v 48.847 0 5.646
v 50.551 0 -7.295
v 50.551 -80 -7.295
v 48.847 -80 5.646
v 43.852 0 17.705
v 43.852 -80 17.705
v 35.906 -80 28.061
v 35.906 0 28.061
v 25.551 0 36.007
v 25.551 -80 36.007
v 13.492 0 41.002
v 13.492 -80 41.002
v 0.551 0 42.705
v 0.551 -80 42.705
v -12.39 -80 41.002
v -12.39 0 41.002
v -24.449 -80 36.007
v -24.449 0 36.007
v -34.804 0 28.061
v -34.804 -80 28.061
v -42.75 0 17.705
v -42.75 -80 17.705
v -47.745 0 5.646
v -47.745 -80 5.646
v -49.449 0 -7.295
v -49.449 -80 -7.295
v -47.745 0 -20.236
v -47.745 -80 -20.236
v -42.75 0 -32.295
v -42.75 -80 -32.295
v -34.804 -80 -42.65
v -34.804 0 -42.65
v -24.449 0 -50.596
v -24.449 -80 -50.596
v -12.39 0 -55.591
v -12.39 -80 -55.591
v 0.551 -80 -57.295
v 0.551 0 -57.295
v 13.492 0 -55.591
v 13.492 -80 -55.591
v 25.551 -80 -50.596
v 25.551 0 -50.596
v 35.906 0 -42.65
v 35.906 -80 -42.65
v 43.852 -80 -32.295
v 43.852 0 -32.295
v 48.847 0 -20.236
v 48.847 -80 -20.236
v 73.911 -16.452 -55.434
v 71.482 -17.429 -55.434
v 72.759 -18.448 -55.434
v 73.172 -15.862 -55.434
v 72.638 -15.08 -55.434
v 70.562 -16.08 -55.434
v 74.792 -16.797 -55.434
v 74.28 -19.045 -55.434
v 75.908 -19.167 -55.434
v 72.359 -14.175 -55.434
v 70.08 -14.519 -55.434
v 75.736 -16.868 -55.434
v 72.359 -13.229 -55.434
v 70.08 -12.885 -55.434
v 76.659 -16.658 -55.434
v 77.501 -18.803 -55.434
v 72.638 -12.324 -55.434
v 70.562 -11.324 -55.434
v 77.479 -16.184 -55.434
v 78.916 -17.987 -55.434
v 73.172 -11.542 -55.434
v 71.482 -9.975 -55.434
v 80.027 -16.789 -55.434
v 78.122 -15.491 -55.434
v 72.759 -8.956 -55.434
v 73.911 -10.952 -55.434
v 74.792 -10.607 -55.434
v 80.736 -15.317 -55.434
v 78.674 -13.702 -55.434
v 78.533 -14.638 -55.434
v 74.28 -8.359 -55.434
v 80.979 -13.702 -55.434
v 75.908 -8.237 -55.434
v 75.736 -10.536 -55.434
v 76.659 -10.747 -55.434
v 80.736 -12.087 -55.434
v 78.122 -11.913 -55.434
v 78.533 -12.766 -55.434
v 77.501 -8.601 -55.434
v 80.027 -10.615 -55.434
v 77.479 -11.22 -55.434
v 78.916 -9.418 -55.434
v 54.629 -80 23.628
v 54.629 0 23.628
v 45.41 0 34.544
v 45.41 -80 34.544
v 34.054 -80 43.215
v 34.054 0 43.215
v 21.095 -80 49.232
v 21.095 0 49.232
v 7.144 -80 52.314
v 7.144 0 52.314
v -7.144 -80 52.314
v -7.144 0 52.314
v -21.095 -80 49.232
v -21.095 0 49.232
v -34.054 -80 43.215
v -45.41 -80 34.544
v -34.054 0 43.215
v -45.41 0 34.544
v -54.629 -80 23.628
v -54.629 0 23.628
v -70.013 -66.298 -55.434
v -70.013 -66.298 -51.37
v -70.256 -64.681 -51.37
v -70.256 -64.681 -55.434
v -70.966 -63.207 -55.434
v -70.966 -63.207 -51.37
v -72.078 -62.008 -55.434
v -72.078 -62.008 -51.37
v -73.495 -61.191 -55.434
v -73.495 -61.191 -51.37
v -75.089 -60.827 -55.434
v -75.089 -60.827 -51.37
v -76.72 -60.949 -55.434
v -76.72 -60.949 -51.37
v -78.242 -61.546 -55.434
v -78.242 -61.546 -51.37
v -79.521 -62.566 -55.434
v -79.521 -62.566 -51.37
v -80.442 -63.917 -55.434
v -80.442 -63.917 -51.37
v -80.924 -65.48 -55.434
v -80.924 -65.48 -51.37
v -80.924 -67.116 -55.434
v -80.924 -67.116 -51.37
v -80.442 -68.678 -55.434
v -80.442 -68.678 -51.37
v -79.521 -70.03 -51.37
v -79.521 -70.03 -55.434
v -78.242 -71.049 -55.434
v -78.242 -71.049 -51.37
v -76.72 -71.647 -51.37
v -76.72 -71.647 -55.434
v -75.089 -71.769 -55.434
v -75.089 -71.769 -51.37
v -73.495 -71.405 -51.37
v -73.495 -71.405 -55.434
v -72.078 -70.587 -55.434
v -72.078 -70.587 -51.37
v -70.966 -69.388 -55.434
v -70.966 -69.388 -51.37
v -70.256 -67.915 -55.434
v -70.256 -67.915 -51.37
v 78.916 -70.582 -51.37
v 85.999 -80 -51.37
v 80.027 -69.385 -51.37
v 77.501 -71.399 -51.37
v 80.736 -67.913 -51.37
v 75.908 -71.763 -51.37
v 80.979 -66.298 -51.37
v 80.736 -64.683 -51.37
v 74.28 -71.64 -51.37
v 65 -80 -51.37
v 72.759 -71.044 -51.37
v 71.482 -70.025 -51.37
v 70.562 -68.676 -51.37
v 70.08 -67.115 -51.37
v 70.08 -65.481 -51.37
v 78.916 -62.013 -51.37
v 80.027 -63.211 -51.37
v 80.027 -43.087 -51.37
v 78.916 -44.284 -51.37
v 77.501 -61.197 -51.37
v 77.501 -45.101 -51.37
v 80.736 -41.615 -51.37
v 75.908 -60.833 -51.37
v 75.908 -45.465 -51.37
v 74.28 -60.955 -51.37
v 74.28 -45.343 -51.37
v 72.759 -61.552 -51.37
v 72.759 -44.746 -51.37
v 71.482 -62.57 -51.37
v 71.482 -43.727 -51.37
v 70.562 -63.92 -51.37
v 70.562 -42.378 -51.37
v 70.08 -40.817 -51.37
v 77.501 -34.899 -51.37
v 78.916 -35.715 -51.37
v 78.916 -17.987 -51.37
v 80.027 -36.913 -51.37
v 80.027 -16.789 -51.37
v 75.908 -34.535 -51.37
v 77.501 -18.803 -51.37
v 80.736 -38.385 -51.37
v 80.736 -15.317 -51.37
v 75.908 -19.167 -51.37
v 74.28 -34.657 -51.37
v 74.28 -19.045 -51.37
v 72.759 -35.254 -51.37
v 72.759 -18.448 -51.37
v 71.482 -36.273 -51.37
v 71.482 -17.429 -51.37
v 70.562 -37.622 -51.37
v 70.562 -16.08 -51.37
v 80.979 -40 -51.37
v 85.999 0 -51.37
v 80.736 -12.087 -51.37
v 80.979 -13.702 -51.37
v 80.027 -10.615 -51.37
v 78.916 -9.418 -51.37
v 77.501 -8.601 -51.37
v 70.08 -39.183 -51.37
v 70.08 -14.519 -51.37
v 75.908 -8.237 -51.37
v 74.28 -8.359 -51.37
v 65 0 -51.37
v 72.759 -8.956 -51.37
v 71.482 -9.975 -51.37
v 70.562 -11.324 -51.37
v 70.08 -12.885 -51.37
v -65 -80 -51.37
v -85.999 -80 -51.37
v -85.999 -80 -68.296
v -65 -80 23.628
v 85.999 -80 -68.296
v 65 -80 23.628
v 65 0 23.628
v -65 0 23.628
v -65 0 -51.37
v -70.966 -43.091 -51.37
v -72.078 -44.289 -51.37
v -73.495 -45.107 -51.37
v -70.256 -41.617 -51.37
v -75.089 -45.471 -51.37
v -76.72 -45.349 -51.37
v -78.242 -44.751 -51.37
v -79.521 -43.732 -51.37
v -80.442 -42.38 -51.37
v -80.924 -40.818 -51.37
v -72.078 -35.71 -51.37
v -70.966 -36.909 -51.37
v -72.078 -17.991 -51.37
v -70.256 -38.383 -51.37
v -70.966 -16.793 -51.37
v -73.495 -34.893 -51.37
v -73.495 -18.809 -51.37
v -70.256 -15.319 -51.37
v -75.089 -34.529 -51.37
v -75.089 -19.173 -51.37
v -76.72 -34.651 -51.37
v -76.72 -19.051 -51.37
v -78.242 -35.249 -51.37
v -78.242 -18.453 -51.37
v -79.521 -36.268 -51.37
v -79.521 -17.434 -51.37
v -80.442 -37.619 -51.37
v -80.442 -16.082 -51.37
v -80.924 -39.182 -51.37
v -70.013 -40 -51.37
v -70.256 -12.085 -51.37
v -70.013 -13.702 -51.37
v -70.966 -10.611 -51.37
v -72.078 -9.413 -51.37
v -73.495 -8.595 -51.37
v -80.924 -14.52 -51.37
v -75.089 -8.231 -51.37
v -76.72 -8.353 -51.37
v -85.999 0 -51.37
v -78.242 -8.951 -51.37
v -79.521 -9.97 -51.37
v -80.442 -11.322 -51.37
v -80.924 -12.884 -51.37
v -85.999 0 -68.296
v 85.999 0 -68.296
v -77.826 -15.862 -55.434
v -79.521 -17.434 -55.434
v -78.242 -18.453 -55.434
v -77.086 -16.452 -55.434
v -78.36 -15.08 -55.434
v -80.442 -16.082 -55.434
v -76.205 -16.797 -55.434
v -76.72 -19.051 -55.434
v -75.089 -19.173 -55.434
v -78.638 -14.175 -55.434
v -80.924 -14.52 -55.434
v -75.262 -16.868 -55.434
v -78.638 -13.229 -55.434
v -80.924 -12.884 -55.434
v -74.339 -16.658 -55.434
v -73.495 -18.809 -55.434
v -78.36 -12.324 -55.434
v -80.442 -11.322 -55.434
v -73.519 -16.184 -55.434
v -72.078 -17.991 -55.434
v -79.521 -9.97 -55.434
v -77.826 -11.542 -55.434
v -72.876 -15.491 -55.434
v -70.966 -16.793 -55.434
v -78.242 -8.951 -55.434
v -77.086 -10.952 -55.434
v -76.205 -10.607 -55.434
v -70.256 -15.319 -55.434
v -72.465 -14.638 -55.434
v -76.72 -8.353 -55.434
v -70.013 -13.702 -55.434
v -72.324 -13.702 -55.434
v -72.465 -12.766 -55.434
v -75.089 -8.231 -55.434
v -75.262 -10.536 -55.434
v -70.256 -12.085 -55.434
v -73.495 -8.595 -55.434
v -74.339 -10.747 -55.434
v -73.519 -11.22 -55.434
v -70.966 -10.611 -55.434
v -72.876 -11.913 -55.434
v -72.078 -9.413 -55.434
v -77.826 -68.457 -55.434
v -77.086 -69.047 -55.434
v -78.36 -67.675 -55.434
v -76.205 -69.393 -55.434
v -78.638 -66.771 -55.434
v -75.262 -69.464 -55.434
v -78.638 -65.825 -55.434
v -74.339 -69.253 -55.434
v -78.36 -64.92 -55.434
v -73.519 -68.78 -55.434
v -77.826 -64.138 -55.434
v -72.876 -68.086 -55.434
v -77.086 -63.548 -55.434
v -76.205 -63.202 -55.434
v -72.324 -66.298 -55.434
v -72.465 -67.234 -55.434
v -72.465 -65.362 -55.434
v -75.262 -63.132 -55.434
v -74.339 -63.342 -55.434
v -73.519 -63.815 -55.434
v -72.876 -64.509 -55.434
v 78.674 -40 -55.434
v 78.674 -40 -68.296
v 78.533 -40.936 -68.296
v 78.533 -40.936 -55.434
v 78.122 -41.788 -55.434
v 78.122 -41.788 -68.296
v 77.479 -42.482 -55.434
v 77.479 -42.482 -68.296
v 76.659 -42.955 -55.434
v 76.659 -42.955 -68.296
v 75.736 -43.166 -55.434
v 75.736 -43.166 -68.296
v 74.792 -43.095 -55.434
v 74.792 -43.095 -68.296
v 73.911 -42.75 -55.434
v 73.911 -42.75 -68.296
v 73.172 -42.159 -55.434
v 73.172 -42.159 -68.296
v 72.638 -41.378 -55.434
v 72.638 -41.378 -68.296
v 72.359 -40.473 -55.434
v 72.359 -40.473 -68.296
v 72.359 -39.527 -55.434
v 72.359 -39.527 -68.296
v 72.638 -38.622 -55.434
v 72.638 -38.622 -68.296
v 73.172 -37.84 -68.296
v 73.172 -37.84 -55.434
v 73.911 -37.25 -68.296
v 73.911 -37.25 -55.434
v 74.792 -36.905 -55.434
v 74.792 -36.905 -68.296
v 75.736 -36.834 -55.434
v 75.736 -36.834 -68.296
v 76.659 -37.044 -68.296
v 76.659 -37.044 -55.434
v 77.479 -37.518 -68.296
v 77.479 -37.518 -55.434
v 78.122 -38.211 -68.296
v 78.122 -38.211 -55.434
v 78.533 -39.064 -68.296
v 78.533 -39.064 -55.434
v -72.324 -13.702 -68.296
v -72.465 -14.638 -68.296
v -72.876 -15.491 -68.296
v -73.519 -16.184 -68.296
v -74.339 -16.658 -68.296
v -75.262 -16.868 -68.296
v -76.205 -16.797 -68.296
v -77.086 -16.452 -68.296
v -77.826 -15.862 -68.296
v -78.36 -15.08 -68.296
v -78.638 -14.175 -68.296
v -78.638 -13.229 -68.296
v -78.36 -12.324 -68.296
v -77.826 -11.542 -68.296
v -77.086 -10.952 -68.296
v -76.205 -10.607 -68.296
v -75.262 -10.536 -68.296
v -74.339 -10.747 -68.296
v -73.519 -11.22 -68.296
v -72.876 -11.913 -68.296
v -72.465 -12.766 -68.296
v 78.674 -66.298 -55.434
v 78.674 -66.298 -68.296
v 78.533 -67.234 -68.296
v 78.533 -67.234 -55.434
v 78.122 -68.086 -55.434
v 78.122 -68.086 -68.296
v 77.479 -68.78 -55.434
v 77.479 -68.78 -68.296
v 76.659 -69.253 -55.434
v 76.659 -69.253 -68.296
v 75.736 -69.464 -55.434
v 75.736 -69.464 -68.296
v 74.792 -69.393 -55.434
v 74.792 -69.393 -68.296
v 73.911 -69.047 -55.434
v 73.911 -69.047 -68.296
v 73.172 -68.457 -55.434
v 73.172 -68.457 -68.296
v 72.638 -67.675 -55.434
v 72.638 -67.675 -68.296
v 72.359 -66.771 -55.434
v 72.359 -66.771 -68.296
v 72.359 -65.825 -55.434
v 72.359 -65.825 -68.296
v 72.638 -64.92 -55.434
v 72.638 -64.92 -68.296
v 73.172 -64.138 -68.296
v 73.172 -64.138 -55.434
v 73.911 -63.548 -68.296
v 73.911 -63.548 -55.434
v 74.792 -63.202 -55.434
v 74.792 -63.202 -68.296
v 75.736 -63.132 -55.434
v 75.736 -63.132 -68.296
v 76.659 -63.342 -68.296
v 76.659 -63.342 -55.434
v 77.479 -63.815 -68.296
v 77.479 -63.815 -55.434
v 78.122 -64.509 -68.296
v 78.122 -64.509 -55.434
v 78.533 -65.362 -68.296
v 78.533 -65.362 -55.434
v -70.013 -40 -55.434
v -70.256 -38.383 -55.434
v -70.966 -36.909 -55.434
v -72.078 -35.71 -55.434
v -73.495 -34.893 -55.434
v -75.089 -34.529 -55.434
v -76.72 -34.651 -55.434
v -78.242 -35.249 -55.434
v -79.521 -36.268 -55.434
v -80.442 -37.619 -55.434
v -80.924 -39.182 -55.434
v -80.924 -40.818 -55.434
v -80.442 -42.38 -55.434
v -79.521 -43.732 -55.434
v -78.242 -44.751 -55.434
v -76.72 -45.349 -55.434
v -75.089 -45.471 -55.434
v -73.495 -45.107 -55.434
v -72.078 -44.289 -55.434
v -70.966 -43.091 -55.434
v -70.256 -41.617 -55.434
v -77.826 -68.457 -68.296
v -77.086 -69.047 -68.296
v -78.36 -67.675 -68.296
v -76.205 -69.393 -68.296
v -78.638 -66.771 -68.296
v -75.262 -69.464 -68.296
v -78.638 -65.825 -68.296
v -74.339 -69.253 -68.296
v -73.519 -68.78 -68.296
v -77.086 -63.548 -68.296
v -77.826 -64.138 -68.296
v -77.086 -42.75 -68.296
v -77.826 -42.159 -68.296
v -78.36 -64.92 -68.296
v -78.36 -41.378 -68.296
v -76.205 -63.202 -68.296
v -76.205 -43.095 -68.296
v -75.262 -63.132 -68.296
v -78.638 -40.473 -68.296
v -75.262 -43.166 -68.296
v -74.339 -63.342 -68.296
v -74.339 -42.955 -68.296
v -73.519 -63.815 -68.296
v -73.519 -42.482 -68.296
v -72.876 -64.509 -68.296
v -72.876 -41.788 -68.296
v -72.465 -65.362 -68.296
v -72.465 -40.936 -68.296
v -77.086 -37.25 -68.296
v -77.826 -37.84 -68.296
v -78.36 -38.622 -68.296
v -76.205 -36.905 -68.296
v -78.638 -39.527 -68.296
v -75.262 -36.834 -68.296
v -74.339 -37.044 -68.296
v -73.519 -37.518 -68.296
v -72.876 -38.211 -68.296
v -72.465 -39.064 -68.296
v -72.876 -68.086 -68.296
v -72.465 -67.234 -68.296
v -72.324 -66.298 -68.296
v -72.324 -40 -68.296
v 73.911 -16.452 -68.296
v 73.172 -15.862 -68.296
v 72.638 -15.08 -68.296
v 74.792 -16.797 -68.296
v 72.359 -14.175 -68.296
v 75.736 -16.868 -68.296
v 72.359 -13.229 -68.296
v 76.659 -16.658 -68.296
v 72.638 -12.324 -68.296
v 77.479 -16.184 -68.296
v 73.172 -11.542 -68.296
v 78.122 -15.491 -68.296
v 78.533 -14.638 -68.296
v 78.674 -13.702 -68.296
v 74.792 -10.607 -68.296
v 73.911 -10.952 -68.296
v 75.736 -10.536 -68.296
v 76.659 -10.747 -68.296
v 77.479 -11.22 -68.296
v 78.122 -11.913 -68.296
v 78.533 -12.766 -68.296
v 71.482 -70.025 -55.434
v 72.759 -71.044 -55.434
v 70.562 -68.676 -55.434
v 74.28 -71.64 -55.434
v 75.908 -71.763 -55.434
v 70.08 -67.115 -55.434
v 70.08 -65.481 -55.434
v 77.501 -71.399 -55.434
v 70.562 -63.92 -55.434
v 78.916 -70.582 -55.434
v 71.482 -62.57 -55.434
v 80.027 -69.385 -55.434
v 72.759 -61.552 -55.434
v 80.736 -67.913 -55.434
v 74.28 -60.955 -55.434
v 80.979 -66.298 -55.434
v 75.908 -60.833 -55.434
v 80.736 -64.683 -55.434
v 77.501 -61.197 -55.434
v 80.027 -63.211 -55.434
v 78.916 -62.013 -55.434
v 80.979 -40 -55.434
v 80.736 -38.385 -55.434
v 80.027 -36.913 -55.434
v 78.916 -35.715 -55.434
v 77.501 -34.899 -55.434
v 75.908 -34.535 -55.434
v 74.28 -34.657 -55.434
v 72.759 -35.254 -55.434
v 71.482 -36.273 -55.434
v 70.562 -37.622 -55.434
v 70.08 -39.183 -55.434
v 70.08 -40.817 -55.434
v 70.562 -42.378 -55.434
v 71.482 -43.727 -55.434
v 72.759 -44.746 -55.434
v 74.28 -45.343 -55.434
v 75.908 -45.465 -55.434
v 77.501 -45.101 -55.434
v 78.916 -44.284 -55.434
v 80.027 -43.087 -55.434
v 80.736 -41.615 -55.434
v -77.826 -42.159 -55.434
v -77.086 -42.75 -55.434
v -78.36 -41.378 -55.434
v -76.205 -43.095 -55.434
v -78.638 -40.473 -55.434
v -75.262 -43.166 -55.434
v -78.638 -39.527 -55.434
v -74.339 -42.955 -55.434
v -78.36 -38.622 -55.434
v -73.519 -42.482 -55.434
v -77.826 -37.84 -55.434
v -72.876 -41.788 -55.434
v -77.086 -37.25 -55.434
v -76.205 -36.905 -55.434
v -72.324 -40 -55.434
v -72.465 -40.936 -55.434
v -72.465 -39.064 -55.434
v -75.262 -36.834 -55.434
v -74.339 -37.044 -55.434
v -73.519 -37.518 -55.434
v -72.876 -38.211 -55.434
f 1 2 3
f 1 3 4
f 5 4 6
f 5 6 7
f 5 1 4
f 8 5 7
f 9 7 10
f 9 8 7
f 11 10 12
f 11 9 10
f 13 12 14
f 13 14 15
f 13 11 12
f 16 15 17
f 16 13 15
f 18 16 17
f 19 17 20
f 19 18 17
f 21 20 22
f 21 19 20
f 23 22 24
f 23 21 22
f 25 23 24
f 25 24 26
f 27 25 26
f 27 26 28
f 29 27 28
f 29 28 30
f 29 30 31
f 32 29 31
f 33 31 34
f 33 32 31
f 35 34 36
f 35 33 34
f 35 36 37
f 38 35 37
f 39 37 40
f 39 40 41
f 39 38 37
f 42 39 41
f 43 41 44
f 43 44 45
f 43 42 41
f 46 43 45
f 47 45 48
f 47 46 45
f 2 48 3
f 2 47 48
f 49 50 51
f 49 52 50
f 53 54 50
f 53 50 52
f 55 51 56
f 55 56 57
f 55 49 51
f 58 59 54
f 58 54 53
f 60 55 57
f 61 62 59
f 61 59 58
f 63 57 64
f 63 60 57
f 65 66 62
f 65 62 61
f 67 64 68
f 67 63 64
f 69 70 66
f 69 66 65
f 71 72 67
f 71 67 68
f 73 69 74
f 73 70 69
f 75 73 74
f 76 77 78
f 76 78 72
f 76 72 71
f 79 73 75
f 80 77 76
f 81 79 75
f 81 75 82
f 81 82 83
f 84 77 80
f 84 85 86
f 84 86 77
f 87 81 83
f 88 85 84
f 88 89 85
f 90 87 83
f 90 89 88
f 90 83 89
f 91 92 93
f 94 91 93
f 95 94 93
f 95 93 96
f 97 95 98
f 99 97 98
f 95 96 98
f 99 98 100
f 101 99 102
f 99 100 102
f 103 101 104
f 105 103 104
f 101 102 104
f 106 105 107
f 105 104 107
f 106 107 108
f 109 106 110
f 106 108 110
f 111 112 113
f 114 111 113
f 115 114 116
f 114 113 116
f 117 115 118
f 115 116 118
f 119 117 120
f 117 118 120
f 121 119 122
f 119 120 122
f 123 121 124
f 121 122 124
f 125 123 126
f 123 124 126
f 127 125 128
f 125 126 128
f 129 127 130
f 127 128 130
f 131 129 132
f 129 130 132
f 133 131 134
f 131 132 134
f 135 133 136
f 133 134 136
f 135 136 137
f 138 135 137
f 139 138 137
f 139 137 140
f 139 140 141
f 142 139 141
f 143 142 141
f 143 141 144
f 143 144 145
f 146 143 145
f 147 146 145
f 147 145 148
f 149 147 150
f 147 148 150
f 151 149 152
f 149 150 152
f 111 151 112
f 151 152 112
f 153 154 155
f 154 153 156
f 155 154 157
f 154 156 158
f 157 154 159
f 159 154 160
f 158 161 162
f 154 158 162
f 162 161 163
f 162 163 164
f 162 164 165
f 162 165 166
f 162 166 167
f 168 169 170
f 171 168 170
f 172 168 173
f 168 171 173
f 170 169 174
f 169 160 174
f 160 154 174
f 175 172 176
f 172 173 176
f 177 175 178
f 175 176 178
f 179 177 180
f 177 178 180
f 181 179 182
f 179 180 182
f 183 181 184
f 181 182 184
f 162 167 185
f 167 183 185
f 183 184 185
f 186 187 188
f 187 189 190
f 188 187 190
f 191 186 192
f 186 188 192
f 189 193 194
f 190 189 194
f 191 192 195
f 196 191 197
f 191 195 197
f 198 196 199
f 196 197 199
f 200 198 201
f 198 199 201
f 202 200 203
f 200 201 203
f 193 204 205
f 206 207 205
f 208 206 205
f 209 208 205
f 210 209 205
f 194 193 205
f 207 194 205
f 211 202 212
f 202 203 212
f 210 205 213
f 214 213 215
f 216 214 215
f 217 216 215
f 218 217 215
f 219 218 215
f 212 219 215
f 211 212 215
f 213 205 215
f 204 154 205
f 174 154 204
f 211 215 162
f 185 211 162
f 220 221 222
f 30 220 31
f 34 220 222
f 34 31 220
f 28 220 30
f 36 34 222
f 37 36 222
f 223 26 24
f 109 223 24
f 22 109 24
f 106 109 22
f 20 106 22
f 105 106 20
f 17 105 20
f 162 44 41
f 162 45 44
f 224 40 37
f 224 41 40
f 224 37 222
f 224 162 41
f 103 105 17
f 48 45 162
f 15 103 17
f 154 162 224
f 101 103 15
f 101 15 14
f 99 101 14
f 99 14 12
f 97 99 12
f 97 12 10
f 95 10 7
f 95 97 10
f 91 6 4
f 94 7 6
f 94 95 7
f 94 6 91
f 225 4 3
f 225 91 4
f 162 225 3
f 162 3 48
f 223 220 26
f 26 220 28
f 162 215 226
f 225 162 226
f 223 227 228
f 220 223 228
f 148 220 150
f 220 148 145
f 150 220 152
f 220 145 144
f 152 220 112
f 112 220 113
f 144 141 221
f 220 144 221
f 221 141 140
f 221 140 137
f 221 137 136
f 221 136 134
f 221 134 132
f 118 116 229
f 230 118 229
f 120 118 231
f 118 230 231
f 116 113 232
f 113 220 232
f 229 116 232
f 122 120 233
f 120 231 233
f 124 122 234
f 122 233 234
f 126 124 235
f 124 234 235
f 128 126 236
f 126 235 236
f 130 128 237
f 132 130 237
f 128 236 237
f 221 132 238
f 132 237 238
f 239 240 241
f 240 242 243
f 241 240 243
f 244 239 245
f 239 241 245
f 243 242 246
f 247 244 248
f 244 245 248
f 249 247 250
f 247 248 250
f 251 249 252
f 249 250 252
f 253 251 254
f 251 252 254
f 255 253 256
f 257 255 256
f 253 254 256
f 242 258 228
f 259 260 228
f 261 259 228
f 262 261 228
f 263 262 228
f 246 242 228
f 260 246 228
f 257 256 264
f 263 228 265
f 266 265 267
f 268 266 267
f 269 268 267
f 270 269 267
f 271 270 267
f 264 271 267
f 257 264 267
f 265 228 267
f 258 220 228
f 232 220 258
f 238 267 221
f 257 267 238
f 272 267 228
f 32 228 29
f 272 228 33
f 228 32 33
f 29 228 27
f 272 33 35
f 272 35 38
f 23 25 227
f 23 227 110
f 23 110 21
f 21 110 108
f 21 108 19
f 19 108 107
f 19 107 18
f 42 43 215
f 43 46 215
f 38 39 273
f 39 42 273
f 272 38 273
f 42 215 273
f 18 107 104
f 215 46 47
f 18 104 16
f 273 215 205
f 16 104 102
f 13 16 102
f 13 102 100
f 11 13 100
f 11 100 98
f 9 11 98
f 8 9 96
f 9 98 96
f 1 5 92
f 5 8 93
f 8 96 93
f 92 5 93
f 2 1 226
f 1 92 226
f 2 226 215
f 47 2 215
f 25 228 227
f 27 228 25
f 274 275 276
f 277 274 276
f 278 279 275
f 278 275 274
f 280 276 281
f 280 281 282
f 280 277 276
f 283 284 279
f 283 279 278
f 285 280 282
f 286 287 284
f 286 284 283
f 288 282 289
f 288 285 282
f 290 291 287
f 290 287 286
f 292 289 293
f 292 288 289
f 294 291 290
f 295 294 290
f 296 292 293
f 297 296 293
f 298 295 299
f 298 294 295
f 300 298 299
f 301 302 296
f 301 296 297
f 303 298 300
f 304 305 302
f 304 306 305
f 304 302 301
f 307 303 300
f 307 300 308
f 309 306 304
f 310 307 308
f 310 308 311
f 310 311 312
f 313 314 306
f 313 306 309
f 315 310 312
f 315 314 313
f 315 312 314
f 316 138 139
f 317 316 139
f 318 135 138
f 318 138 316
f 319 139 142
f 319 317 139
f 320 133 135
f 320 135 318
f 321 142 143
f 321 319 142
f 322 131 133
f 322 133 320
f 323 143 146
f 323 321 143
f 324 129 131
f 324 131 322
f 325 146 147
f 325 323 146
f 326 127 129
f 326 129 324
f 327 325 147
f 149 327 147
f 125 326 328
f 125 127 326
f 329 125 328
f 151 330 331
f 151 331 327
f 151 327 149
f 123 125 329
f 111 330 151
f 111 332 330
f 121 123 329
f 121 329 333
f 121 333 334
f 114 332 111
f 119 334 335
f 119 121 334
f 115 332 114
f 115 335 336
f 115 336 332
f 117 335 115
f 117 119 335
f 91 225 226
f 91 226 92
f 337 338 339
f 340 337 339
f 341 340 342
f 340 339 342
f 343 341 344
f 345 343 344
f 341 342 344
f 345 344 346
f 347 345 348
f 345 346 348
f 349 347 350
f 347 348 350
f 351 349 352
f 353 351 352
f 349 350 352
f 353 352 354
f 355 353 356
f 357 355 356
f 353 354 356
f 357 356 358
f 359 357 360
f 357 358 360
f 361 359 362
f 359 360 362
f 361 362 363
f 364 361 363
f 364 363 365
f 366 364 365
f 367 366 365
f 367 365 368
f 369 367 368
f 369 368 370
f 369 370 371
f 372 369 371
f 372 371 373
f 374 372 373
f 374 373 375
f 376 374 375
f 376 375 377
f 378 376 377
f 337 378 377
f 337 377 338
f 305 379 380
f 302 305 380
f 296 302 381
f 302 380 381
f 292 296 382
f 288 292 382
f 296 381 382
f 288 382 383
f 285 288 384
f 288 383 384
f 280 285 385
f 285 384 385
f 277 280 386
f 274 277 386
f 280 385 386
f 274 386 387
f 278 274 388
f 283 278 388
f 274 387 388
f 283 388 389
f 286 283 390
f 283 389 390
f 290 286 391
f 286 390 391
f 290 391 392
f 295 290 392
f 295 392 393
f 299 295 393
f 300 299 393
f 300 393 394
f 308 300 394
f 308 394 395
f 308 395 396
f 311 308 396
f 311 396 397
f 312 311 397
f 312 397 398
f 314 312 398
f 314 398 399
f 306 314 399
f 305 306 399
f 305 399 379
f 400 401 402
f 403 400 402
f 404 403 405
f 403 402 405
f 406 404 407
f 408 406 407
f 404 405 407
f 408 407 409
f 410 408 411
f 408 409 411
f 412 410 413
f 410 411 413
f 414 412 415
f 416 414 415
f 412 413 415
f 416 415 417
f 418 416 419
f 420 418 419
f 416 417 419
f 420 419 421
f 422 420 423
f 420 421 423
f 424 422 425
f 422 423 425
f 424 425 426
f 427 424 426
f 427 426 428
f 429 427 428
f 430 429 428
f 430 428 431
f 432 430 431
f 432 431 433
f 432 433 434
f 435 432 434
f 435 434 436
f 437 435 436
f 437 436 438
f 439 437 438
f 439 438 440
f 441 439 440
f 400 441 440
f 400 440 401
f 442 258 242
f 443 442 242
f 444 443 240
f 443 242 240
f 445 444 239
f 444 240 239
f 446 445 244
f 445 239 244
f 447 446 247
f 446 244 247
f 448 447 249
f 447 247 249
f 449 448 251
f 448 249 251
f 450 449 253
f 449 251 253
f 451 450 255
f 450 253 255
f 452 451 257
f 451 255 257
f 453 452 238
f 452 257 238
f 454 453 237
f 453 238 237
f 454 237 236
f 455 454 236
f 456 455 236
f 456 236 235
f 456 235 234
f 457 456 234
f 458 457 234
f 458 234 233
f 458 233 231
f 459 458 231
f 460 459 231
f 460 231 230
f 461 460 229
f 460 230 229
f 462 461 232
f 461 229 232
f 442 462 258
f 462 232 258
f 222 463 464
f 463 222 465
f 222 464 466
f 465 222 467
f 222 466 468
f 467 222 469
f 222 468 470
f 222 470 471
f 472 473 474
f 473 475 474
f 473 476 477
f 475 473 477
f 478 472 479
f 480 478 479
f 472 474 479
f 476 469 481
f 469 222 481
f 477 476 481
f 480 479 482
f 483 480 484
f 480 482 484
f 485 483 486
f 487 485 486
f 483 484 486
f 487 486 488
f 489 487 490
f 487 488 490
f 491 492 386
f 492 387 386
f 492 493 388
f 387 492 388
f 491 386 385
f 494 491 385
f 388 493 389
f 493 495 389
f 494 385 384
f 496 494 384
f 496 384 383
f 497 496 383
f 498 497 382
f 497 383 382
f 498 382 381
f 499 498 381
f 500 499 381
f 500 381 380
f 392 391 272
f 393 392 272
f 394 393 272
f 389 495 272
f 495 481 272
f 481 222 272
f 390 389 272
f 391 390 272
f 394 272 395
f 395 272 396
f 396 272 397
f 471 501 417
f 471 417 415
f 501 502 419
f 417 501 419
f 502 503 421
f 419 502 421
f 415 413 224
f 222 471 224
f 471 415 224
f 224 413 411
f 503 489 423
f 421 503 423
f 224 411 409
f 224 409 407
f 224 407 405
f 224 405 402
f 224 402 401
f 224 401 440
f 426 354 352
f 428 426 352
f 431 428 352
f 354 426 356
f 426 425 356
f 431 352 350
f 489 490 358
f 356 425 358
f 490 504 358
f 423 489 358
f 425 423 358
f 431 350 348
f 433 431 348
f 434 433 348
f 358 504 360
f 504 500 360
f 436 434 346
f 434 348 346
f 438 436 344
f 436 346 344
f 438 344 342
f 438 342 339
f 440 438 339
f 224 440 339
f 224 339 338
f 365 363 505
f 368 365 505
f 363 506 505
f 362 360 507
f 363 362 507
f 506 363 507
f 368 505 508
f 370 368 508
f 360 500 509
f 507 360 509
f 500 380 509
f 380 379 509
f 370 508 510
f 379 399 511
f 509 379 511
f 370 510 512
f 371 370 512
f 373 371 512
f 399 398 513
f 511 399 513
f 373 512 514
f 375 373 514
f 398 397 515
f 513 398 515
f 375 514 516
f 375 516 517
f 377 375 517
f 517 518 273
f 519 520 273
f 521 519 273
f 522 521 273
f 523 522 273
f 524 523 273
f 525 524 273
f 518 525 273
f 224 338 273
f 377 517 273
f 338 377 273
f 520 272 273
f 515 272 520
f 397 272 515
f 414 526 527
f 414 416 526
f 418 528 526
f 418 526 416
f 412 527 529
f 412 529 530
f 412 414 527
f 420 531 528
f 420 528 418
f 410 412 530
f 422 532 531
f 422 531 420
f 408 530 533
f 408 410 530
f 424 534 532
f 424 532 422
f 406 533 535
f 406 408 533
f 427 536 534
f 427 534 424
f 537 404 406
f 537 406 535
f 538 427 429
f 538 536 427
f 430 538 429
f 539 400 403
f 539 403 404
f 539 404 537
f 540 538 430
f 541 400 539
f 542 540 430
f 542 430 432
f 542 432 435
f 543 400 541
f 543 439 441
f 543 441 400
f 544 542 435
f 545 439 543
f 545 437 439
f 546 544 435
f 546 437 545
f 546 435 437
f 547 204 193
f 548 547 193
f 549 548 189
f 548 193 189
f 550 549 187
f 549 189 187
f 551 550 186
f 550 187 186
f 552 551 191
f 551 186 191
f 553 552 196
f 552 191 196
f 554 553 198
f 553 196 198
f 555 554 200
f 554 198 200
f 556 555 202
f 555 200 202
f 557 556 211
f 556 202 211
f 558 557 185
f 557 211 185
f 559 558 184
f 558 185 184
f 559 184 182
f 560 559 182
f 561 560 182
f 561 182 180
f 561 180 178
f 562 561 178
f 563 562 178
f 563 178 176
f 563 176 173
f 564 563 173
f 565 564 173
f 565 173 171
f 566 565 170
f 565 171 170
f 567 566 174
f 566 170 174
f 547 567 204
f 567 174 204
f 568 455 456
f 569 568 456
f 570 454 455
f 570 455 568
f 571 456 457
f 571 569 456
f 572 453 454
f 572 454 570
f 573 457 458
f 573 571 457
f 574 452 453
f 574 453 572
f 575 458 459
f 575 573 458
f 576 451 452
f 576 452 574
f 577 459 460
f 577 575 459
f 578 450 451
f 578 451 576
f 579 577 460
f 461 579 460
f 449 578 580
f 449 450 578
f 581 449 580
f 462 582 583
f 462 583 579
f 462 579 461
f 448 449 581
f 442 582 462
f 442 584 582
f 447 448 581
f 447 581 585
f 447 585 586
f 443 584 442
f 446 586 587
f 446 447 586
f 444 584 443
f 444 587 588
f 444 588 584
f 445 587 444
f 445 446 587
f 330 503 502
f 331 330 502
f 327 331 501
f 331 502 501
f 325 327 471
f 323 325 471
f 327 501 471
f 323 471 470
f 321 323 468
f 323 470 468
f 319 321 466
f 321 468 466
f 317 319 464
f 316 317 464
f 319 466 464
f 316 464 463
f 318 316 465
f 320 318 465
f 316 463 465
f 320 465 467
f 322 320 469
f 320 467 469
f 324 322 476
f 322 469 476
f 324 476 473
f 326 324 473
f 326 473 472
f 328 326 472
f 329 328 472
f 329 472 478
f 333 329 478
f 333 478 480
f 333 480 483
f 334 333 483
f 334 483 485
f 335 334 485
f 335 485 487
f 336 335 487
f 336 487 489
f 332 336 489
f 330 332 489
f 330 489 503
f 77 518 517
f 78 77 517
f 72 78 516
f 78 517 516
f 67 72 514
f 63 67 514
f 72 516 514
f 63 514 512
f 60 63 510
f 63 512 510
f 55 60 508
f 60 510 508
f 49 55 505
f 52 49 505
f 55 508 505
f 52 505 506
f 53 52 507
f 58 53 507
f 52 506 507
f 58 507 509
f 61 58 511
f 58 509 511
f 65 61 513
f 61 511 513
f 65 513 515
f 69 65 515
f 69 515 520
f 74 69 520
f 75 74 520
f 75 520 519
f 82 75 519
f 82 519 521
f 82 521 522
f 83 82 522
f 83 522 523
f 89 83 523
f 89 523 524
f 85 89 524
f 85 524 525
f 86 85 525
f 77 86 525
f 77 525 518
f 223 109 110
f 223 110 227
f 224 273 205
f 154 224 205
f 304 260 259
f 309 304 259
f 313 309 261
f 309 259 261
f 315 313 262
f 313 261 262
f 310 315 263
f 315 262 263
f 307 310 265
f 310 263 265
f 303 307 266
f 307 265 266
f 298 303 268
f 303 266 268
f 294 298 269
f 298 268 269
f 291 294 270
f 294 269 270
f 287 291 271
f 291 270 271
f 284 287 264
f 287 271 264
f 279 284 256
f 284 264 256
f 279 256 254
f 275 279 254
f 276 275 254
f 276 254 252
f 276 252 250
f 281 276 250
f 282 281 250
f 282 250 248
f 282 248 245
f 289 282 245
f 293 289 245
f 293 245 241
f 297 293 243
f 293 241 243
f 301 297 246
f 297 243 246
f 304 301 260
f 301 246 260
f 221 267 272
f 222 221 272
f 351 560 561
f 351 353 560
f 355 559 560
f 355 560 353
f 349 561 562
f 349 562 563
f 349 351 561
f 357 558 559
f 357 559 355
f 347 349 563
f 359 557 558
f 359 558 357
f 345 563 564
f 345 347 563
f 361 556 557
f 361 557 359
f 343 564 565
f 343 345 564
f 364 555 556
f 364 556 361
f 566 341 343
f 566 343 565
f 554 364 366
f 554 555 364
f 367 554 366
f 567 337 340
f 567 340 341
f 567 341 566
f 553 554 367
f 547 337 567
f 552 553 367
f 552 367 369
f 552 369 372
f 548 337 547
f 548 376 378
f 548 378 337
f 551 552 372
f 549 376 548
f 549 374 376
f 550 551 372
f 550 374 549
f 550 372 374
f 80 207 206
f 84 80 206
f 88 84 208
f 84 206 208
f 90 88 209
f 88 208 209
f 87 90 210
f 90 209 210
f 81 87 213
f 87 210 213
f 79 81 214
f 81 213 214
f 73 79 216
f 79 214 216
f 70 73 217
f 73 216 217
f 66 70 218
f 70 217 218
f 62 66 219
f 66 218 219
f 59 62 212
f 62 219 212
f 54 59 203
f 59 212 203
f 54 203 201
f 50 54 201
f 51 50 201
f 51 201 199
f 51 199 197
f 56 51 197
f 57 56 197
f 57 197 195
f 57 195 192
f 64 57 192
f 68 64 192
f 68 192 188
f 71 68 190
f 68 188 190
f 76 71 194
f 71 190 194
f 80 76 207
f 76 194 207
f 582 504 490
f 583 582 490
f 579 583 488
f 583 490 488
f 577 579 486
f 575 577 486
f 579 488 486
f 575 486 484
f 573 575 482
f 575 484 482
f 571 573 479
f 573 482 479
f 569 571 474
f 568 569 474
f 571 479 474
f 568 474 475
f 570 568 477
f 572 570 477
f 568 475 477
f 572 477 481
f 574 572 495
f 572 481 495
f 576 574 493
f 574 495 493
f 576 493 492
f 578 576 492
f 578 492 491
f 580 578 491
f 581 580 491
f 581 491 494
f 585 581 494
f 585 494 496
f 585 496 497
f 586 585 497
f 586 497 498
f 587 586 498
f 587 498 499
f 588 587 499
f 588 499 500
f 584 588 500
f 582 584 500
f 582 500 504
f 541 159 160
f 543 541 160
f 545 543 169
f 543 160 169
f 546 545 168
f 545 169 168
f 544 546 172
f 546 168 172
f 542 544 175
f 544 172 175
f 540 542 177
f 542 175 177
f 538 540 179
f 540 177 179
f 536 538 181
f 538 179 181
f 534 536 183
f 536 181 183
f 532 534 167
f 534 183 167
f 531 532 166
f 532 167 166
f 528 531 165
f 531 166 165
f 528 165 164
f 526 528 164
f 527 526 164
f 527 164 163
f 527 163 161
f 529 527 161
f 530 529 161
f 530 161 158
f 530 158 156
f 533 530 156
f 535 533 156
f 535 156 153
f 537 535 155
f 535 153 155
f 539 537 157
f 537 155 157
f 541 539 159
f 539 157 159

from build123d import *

# Parameters (mm, degrees)
F0_R     = 49.9999
F1_DEPTH = 79.99984
F2_R     = 3.175
F3_DEPTH = 120.99898
F4_DEPTH = 120.99898
F5_R     = 5.48005
F6_DEPTH = 4.064
F7_R     = 5.4864
F8_DEPTH = 4.064


with BuildPart() as f1:
    # F0 (on Front) → F1 (new body)
    with BuildSketch(Plane.XZ):
        with BuildLine():
            Line((-85.99932, -68.295799), (0, -68.295799))
            Line((0, -68.295799), (85.99932, -68.295799))
            Line((85.99932, -68.295799), (85.99932, -51.370141))
            Line((85.99932, -51.370141), (64.99987, -51.370141))
            Line((64.99987, -51.370141), (64.99987, 23.628439))
            Line((64.99987, 23.628439), (54.628692, 23.628439))
            ThreePointArc((54.628692, 23.628439), (0, 52.702181), (-54.628692, 23.628439))
            Line((-54.628692, 23.628439), (-64.99987, 23.628439))
            Line((-64.99987, 23.628439), (-64.99987, -51.370141))
            Line((-64.99987, -51.370141), (-85.99932, -51.370141))
            Line((-85.99932, -51.370141), (-85.99932, -68.295799))
        make_face()
        with Locations((0.550864, -7.294665)):
            Circle(F0_R, mode=Mode.SUBTRACT)
    extrude(amount=F1_DEPTH)

    # F2 (on face) → F3 (cut, through all)
    with BuildSketch(Plane(origin=(0, 0, -68.295799), x_dir=(1, 0, 0), z_dir=(0, 0, -1))):
        with Locations((-75.49896, 66.29781)):
            Circle(F2_R)
        with Locations((-75.49896, 39.99992)):
            Circle(F2_R)
        with Locations((-75.49896, 13.70203)):
            Circle(F2_R)
        with Locations((75.49896, 66.29781)):
            Circle(F2_R)
        with Locations((75.49896, 39.99992)):
            Circle(F2_R)
        with Locations((75.49896, 13.70203)):
            Circle(F2_R)
    extrude(amount=-F3_DEPTH, mode=Mode.SUBTRACT)

    # F2 (on face) → F4 (cut, through all)
    with BuildSketch(Plane(origin=(0, 0, -68.295799), x_dir=(1, 0, 0), z_dir=(0, 0, -1))):
        with Locations((-75.49896, 66.29781)):
            Circle(F2_R)
        with Locations((-75.49896, 39.99992)):
            Circle(F2_R)
        with Locations((-75.49896, 13.70203)):
            Circle(F2_R)
        with Locations((75.49896, 66.29781)):
            Circle(F2_R)
        with Locations((75.49896, 39.99992)):
            Circle(F2_R)
        with Locations((75.49896, 13.70203)):
            Circle(F2_R)
    extrude(amount=-F4_DEPTH, mode=Mode.SUBTRACT)

    # F5 (on face) → F6 (cut)
    with BuildSketch(Plane.XY.offset(-51.370141)):
        with Locations((75.49896, -13.70203)):
            Circle(F5_R)
        with Locations((75.49896, -39.99992)):
            Circle(F5_R)
        with Locations((75.49896, -66.29781)):
            Circle(F5_R)
    extrude(amount=-F6_DEPTH, mode=Mode.SUBTRACT)

    # F7 (on face) → F8 (cut)
    with BuildSketch(Plane.XY.offset(-51.370141)):
        with Locations((-75.49896, -13.70203)):
            Circle(F7_R)
        with Locations((-75.49896, -39.99992)):
            Circle(F7_R)
        with Locations((-75.49896, -66.29781)):
            Circle(F7_R)
    extrude(amount=-F8_DEPTH, mode=Mode.SUBTRACT)


solid = f1.part
